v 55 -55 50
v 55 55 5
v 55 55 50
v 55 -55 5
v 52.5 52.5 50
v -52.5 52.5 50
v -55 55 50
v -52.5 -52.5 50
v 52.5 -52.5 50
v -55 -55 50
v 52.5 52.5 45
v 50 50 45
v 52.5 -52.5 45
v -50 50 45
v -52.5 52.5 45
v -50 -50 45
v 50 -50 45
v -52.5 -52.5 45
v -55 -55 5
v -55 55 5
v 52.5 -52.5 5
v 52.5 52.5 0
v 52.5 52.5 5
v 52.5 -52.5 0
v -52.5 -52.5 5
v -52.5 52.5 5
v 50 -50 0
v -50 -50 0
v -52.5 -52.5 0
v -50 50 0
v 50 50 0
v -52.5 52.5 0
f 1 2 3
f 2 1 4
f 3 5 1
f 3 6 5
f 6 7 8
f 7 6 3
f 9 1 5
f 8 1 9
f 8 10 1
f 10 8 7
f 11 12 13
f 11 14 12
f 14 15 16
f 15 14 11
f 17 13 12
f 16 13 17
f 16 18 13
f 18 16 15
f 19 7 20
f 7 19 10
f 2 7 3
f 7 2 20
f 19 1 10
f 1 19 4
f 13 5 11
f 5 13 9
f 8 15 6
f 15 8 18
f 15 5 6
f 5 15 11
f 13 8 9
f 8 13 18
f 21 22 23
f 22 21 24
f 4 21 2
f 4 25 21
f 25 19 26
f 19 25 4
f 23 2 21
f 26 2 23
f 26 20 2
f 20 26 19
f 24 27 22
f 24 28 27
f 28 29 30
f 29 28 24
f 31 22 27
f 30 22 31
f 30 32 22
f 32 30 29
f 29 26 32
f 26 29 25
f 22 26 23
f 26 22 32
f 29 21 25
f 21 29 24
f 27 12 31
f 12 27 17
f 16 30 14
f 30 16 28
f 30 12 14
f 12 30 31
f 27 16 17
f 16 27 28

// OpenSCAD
petri_diameter = 80;  // Диаметр чашки Петри


box_width = 100;      // Внутренняя ширина коробки
box_height = 60;      // Внутренняя высота коробки
wall_thickness = 5;   // Толшина стенки
bottom_thickness = 5; // Толнина дна

cap_width = 100;

border_width = box_width-cap_width;      // Ширина Кольца освещения в проекции на землю
//border_height = 100-80+20-5;     // высота кольца
border_height = 40;     // высота кольца

slot_height = 5;            // Ширина паза для установки трубы 
slot_width = slot_height/2; // Толшина паза для установки трубы

doorslot_width = 5;       // Толшина паза для установки шторки
doorslot_depth = 2.1;     // Ширина паза для установки шторки
doorslot_thickness = 4;   // Толшина выступа для монтажа шторки
door_width = 100;         // ширина отверстия двери
door_height = box_height; // высота отверстия двери
eps = 0.02;


// Модуль пустотелой усеченной пирамиды
module lighting_ring() {
    // Проверка на корректность размеров (комментарий)
    // assert(a_bot > 2*t && a_top > 2*t);
    bot_out_width = box_width+2*wall_thickness;
    bot_in_width = box_width;
    top_out_width = bot_out_width-border_width;
    top_in_width = bot_in_width-border_width;
    
    // Верхний коннектор
    translate([0,0,border_height+slot_height*3/2])
    difference(){
        cube([top_out_width, top_out_width, slot_height],center=true);
        cube([top_in_width+2*slot_width, top_in_width+2*slot_width, slot_height+eps],center=true);
    }
    // Нижний коннектор
    translate([0,0,slot_height/2])
    difference(){
    cube([bot_in_width+2*slot_width, bot_in_width+2*slot_width, slot_height],center=true);
    cube([bot_in_width, bot_in_width, slot_height+eps],center=true);
    }
    translate([0,0,slot_height])
    difference() {
        // Внешняя усеченная пирамида
        linear_extrude(height=border_height, center=false, scale=top_out_width/bot_out_width)
            square([bot_out_width, bot_out_width], center=true);
        // Внутренняя усеченная пирамида
        translate([0,0,-eps])
        linear_extrude(height=border_height+2*eps, center=false, scale=top_in_width/ bot_in_width)
                square([bot_in_width, bot_in_width], center=true);
    }
}
lighting_ring();
